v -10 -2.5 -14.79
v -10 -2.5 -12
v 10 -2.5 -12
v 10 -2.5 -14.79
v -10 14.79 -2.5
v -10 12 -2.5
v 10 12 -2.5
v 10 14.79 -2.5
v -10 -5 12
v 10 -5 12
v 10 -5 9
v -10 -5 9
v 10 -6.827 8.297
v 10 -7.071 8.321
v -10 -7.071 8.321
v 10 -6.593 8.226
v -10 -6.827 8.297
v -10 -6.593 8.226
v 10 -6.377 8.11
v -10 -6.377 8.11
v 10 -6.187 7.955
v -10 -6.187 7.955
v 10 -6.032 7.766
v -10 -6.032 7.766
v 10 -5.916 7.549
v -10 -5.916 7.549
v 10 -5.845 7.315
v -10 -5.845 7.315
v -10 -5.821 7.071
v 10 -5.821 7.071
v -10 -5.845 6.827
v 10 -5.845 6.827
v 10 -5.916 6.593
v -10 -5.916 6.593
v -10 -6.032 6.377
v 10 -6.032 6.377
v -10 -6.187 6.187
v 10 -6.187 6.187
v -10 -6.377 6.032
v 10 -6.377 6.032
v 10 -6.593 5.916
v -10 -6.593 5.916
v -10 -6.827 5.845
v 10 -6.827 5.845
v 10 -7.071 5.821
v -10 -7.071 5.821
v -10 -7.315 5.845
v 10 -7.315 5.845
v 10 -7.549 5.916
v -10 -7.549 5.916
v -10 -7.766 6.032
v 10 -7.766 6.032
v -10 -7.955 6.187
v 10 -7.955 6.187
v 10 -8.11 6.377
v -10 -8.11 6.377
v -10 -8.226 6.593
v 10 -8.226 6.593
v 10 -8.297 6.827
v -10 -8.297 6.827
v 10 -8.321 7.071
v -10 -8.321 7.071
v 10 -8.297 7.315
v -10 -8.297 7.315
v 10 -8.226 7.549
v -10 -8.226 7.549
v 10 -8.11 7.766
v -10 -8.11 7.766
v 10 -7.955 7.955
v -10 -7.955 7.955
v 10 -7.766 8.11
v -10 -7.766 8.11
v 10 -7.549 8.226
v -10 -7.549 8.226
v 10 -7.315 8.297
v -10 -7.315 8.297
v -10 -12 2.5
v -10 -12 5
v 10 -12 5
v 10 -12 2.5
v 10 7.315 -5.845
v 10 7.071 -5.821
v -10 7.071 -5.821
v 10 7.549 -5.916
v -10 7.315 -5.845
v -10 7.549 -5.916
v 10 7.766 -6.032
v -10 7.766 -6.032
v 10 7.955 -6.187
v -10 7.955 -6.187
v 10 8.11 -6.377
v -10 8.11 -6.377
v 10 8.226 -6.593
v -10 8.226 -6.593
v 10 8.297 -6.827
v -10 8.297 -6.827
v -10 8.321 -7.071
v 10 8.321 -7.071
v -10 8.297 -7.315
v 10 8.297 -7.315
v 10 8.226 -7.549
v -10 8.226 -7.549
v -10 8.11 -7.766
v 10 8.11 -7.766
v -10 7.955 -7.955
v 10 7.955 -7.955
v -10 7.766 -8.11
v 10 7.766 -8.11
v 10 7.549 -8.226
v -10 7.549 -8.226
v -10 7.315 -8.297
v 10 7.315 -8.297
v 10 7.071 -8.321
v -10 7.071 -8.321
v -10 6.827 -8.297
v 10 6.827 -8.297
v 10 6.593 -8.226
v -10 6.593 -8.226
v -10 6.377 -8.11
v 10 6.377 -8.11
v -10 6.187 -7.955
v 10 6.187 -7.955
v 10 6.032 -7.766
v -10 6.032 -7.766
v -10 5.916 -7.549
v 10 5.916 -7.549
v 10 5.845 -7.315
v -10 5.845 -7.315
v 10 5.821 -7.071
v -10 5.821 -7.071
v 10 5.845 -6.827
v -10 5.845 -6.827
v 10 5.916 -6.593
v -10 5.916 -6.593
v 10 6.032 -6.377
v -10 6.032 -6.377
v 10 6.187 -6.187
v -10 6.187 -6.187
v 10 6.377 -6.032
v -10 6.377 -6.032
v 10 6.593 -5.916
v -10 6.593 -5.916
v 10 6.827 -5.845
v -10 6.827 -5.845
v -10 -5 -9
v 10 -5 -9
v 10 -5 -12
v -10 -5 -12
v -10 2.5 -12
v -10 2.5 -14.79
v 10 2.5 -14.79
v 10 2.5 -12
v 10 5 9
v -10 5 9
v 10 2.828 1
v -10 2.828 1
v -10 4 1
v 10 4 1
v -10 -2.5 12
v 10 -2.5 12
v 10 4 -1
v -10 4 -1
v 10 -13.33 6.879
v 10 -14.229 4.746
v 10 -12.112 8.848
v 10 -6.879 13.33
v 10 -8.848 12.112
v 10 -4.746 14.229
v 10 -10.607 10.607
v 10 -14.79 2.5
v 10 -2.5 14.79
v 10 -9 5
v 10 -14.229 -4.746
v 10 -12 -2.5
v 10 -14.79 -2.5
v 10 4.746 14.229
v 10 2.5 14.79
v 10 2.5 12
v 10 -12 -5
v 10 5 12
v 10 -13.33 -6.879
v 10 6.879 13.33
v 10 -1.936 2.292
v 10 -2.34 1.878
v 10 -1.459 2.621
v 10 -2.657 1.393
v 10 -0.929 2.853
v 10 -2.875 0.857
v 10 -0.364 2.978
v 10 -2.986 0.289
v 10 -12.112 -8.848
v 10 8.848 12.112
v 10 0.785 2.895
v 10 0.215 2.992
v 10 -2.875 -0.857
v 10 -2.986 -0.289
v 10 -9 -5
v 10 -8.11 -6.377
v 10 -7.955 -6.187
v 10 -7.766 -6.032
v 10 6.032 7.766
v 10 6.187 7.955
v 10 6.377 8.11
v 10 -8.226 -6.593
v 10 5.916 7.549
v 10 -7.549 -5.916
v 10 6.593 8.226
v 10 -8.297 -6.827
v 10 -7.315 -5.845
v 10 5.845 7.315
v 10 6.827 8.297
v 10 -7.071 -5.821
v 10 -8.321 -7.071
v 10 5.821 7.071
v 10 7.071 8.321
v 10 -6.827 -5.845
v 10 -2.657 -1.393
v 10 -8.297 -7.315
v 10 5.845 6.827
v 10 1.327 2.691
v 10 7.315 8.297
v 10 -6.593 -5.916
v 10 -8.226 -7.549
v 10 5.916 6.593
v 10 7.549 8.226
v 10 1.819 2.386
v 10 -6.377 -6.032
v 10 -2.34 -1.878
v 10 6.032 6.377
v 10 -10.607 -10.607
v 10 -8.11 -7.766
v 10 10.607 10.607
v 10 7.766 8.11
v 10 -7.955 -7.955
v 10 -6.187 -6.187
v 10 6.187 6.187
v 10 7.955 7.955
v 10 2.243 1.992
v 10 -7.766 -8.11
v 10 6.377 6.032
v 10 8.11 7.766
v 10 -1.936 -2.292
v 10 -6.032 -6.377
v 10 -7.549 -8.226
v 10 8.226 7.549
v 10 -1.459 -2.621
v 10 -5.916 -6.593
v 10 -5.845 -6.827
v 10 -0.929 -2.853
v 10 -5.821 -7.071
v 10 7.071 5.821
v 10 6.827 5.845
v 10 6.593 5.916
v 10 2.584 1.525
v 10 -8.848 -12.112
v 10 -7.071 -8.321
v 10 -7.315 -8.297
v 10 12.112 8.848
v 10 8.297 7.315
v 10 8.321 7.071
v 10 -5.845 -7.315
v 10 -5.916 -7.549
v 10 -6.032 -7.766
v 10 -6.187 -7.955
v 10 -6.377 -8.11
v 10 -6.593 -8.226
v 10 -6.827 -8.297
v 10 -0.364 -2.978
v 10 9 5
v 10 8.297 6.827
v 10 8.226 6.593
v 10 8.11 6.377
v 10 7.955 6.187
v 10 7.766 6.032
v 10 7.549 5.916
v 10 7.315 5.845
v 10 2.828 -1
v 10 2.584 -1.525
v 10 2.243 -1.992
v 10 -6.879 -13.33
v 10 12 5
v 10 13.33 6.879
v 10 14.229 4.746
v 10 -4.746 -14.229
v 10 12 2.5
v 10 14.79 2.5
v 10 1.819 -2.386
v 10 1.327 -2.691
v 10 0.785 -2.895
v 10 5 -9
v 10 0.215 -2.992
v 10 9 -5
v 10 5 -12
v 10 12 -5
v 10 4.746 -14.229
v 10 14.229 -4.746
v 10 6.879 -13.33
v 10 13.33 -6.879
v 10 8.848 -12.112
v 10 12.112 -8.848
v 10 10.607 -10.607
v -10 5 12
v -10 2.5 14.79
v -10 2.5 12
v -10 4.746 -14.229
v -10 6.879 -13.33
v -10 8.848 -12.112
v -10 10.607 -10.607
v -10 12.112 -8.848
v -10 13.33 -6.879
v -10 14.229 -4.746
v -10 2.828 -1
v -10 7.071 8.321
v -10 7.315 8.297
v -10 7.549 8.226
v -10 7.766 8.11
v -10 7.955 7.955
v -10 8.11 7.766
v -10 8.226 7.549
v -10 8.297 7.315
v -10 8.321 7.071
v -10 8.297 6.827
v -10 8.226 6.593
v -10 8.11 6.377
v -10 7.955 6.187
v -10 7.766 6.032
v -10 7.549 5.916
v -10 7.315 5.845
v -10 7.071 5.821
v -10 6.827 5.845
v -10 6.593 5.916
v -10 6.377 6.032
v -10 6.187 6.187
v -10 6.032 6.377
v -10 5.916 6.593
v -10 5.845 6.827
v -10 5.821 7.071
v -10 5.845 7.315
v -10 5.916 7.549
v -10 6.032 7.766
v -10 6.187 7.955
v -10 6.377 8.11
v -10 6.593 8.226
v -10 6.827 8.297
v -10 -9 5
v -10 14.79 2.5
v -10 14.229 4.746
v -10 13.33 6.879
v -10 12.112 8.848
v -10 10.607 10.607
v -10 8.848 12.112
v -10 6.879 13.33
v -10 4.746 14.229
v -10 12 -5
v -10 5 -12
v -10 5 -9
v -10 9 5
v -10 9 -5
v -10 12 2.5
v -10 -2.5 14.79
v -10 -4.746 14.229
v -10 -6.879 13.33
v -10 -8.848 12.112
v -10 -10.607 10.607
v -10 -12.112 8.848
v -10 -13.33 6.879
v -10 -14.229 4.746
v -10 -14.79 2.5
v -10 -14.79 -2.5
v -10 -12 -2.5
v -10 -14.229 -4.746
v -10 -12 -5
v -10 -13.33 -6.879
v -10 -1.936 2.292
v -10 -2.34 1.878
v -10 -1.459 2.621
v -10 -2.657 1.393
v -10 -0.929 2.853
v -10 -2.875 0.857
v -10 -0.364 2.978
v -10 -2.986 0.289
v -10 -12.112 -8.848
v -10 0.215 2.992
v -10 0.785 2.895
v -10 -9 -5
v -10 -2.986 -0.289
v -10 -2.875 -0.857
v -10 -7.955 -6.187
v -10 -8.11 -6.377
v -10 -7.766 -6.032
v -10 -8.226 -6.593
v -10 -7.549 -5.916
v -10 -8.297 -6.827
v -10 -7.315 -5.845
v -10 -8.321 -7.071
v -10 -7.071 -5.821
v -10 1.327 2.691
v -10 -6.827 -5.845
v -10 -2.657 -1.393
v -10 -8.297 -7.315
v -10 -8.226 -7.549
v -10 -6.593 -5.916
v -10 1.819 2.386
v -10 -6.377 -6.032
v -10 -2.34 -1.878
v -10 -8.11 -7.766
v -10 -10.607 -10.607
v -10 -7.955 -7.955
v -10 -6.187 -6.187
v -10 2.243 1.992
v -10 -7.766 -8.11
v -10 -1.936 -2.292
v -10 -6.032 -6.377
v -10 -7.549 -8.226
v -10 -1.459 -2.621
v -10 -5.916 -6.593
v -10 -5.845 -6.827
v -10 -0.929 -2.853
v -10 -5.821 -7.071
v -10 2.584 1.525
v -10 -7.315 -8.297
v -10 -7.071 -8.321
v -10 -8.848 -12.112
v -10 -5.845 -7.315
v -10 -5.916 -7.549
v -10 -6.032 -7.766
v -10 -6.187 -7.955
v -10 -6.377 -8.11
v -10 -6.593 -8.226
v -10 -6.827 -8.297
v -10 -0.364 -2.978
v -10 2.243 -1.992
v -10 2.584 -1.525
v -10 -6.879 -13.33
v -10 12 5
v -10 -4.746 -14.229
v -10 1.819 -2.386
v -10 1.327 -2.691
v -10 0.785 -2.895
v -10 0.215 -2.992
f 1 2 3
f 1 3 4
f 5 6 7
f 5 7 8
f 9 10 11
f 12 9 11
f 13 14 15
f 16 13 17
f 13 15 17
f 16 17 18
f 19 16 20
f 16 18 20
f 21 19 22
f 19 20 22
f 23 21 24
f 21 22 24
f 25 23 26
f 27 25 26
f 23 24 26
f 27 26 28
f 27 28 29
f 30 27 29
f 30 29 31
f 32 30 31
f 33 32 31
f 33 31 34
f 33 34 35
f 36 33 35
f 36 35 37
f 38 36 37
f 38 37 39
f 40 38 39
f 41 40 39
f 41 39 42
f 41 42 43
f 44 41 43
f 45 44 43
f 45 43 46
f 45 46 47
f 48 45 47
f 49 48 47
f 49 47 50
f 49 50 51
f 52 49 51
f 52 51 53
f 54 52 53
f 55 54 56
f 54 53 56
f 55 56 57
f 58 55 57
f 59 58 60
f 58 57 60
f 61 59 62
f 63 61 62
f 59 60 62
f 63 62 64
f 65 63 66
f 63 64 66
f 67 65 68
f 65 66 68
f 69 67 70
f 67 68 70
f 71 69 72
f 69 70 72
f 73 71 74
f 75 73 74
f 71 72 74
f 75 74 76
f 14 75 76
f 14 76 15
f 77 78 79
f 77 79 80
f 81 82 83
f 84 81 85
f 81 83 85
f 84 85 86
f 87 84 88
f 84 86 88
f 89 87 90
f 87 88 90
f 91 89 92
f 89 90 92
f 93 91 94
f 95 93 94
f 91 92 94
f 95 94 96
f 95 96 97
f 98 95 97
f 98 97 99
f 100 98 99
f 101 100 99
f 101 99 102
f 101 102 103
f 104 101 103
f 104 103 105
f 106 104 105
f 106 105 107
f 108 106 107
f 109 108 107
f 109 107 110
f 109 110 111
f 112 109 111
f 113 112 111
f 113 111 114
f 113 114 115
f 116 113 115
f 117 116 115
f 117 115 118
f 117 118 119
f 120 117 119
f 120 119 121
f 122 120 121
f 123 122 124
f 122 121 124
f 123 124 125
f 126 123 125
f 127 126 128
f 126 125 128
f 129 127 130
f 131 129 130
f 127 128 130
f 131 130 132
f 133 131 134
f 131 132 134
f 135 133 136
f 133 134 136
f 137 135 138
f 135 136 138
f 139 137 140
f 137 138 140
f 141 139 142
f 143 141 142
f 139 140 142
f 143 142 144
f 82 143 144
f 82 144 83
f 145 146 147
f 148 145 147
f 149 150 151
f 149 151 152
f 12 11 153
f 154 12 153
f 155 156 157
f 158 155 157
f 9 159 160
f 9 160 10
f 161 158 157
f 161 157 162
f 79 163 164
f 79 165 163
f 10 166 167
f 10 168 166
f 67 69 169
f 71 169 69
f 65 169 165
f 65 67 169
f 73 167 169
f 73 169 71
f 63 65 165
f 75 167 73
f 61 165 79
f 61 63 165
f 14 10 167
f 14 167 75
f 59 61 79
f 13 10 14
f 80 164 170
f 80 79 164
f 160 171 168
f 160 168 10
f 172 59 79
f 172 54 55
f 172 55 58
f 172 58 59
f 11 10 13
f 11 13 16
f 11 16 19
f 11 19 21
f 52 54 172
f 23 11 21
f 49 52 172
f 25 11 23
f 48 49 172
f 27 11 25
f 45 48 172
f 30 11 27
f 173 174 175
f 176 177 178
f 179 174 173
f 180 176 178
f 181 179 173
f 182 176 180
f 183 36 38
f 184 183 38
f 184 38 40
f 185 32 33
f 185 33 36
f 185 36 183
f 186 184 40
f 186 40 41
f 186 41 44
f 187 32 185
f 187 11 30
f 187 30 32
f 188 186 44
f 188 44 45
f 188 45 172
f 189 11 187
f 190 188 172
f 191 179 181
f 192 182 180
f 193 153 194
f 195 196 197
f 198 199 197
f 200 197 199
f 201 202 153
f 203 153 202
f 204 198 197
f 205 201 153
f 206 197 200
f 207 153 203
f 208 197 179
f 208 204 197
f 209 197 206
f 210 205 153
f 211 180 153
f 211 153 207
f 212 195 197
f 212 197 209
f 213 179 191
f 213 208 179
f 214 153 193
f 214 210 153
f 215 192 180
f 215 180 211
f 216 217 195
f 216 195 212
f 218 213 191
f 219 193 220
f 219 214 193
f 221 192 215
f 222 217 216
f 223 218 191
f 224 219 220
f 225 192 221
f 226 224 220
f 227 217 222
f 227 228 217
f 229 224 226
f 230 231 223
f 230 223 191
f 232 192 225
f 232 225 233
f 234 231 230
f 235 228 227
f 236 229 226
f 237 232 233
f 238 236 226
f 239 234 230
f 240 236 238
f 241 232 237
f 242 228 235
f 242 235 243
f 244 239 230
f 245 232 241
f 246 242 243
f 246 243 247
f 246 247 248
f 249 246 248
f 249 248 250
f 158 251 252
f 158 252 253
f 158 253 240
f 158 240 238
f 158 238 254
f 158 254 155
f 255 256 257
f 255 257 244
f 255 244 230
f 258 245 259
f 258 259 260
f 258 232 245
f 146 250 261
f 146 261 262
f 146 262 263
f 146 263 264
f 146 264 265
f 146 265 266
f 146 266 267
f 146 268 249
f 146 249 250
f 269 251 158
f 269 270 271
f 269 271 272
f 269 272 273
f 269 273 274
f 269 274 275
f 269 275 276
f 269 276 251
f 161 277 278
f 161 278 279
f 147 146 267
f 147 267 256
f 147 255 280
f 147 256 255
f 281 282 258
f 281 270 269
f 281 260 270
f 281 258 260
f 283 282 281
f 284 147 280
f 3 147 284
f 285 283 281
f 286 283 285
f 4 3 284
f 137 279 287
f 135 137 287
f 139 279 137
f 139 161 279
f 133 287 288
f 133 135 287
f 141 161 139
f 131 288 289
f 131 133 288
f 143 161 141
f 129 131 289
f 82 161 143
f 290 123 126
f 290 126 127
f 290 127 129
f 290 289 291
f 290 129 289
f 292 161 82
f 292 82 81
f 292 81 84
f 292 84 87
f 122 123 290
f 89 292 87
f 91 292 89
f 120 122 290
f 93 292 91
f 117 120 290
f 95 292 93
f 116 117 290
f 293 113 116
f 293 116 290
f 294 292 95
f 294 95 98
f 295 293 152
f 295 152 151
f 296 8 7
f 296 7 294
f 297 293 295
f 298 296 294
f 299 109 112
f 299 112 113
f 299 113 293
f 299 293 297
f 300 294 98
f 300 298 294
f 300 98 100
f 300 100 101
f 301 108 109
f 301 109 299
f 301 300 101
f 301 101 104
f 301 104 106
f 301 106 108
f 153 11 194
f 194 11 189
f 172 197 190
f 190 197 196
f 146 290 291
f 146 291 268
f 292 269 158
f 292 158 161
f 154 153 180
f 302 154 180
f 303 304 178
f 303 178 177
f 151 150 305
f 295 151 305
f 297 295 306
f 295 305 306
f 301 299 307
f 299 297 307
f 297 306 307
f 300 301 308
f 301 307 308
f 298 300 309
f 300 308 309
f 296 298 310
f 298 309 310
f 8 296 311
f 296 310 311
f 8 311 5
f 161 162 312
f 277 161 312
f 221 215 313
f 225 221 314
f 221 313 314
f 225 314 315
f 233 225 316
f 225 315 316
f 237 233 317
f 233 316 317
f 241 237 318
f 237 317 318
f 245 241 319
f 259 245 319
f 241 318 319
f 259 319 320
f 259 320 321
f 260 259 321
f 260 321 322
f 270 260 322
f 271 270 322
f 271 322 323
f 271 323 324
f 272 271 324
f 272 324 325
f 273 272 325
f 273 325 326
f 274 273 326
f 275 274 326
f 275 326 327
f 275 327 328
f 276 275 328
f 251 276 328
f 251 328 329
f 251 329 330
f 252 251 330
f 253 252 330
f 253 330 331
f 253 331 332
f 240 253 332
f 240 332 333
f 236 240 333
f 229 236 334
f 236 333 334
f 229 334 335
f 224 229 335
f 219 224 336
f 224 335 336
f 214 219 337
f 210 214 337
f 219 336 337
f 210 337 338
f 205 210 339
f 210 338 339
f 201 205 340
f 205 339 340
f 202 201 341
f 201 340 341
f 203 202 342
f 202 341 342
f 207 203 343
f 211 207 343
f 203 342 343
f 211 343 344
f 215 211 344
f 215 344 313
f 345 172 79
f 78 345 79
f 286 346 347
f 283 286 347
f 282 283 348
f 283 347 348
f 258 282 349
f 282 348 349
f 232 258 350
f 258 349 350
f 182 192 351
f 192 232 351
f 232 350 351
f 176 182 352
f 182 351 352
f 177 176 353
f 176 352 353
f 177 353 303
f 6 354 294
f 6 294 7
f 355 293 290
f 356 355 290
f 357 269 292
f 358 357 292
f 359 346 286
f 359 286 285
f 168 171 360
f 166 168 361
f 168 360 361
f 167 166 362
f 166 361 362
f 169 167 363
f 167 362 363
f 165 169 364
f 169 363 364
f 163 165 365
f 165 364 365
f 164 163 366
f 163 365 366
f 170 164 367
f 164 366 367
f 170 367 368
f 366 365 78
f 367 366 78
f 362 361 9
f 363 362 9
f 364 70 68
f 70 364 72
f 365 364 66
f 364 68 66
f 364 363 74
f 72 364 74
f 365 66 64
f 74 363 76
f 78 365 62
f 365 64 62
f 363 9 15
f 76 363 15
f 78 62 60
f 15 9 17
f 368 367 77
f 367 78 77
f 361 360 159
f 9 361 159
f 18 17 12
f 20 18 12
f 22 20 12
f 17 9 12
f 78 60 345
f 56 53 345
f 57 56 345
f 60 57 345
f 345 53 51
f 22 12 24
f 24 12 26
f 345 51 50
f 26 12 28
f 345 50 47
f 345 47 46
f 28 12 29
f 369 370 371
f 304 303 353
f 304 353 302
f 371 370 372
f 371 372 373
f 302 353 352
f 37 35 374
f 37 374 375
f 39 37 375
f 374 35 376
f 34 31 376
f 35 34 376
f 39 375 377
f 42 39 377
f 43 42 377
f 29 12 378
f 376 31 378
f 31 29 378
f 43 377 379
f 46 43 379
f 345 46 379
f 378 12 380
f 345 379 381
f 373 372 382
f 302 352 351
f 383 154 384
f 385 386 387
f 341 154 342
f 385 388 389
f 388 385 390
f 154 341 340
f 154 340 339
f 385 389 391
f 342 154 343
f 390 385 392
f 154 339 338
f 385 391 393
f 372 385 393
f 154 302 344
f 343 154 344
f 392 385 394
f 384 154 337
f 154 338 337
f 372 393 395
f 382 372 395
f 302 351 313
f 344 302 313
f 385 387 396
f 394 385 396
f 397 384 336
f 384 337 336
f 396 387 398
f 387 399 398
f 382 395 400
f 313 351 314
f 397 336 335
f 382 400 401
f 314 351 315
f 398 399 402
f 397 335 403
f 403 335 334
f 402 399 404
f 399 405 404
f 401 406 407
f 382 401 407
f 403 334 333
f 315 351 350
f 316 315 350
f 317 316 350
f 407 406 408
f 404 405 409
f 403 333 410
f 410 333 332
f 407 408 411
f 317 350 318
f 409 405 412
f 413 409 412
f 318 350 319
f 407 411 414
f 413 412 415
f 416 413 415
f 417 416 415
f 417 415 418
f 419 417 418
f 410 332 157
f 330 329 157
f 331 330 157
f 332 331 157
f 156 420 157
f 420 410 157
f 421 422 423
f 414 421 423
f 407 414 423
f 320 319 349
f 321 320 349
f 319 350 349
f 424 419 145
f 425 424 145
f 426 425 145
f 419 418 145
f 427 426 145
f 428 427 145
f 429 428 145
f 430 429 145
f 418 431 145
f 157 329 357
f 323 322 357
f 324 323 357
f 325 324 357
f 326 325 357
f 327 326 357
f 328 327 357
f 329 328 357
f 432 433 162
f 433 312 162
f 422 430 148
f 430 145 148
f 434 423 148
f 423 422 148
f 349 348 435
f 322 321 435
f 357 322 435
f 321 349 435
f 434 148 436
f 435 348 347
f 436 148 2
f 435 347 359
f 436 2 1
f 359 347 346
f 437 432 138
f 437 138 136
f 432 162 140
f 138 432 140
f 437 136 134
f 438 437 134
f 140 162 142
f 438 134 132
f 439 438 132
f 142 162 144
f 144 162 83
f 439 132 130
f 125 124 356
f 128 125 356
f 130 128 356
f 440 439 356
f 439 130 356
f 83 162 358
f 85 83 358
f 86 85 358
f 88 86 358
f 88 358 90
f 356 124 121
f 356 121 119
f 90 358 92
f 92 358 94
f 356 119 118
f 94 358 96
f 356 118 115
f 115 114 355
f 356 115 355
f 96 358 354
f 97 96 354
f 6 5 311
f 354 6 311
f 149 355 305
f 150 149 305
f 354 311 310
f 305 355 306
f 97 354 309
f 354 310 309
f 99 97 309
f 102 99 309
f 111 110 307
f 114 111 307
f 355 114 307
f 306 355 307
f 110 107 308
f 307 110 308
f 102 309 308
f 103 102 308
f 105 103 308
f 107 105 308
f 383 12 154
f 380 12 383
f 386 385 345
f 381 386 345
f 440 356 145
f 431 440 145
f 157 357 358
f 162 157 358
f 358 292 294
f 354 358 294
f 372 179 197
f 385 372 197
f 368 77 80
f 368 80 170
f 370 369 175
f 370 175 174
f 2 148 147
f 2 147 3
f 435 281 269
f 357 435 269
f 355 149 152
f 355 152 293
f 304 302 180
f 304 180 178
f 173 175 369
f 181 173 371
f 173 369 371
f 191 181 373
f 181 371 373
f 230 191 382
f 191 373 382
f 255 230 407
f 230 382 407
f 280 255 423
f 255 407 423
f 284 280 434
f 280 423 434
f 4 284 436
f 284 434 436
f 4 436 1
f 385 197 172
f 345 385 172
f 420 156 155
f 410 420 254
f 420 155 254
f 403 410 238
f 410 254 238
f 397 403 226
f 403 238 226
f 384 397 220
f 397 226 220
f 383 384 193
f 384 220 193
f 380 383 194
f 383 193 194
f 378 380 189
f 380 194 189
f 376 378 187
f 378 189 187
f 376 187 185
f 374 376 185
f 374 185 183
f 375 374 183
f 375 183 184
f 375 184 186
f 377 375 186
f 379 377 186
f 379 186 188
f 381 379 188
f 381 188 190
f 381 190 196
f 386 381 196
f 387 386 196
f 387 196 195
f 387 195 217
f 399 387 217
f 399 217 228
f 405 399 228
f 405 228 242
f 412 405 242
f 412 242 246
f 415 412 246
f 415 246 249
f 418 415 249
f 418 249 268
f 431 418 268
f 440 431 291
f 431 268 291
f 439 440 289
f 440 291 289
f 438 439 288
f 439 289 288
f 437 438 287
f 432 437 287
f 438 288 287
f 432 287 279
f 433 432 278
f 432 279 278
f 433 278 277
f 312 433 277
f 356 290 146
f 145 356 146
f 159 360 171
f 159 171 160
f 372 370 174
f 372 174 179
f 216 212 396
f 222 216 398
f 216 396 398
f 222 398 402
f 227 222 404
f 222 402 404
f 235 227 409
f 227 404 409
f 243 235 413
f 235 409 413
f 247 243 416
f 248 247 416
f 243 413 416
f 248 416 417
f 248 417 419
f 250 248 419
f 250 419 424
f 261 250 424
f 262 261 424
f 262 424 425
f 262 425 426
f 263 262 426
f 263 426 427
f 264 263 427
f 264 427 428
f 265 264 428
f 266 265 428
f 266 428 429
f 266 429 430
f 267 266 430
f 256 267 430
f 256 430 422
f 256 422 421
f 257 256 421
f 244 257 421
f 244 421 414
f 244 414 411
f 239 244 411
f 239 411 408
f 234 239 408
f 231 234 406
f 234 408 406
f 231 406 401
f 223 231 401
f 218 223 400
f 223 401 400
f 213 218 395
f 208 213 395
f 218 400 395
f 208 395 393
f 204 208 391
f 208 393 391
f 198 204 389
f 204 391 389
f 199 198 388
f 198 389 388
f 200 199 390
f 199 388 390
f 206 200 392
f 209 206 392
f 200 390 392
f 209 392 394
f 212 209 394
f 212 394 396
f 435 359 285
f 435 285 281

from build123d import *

# Parameters (mm, degrees)
EXTRUDE_1_DEPTH          = 10
EXTRUDE_1_DEPTH_BACK     = 10
SKETCH_1_R               = 15
SKETCH_2_R               = 3
CUT_EXTRUDE_1_DEPTH      = 30.154759474
CUT_EXTRUDE_2_DEPTH      = 30.154759474
M3X0_5_1_D               = 2.5
PATTERN_CIRCULAR_2_COUNT = 4
CUT_EXTRUDE_3_DEPTH      = 29.939592257


with BuildPart() as part:
    # ｽｹｯﾁ1 → ﾎﾞｽ - 押し出し1 (new, two sides: drawn at the far end of the back side and taken through both)
    with BuildSketch(Plane(origin=(0, 0, 0), x_dir=(0, 0, -1), z_dir=(1, 0, 0)).offset(-EXTRUDE_1_DEPTH_BACK)):
        Circle(SKETCH_1_R)
    extrude(amount=EXTRUDE_1_DEPTH + EXTRUDE_1_DEPTH_BACK)

    # ｽｹｯﾁ2 → ｶｯﾄ - 押し出し1 (cut, through all)
    with BuildSketch(Plane(origin=(10, 0, 0), x_dir=(0, 0, -1), z_dir=(1, 0, 0))):
        Circle(SKETCH_2_R)
    extrude(amount=-CUT_EXTRUDE_1_DEPTH, mode=Mode.SUBTRACT)

    # ｽｹｯﾁ3 → ｶｯﾄ - 押し出し2 (cut, through all)
    with BuildSketch(Plane(origin=(10, 0, 0), x_dir=(0, 0, -1), z_dir=(1, 0, 0))):
        Polygon((5, 12), (2.5, 12), (2.5, 15), (-2.5, 15), (-2.5, 12), (-5, 12), (-5, 9), (5, 9), align=None)
    cut_extrude_2 = extrude(amount=-CUT_EXTRUDE_2_DEPTH, mode=Mode.SUBTRACT)

    # M3x0.5 ねじ穴1 (through all)
    with Locations(Plane(origin=(10, 0, 0), x_dir=(0, 0, -1), z_dir=(1, 0, 0))):
        with Locations((-7.071067812, 7.071067812), (7.071067812, -7.071067812), (7.071067812, 7.071067812), (-7.071067812, -7.071067812)):
            Hole(M3X0_5_1_D / 2)

    # 円形ﾊﾟﾀｰﾝ2: ｶｯﾄ - 押し出し2 ×4 about axis
    pattern_circular_2_axis = Axis((-10, 0, 0), (1, 0, 0))
    for i in range(1, PATTERN_CIRCULAR_2_COUNT):
        add(cut_extrude_2.rotate(pattern_circular_2_axis, i * 360 / PATTERN_CIRCULAR_2_COUNT), mode=Mode.SUBTRACT)

    # ｽｹｯﾁ7 → ｶｯﾄ - 押し出し3 (cut, through all)
    with BuildSketch(Plane(origin=(10, 0, 0), x_dir=(0, 0, -1), z_dir=(1, 0, 0))):
        with BuildLine():
            Line((-1, 4), (1, 4))
            Line((1, 4), (1, 3))
            Line((1, 3), (1, 2.828427125))
            ThreePointArc((1, 2.828427125), (0, 3), (-1, 2.828427125))
            Line((-1, 2.828427125), (-1, 3))
            Line((-1, 3), (-1, 4))
        make_face()
    extrude(amount=-CUT_EXTRUDE_3_DEPTH, mode=Mode.SUBTRACT)


solid = part.part
